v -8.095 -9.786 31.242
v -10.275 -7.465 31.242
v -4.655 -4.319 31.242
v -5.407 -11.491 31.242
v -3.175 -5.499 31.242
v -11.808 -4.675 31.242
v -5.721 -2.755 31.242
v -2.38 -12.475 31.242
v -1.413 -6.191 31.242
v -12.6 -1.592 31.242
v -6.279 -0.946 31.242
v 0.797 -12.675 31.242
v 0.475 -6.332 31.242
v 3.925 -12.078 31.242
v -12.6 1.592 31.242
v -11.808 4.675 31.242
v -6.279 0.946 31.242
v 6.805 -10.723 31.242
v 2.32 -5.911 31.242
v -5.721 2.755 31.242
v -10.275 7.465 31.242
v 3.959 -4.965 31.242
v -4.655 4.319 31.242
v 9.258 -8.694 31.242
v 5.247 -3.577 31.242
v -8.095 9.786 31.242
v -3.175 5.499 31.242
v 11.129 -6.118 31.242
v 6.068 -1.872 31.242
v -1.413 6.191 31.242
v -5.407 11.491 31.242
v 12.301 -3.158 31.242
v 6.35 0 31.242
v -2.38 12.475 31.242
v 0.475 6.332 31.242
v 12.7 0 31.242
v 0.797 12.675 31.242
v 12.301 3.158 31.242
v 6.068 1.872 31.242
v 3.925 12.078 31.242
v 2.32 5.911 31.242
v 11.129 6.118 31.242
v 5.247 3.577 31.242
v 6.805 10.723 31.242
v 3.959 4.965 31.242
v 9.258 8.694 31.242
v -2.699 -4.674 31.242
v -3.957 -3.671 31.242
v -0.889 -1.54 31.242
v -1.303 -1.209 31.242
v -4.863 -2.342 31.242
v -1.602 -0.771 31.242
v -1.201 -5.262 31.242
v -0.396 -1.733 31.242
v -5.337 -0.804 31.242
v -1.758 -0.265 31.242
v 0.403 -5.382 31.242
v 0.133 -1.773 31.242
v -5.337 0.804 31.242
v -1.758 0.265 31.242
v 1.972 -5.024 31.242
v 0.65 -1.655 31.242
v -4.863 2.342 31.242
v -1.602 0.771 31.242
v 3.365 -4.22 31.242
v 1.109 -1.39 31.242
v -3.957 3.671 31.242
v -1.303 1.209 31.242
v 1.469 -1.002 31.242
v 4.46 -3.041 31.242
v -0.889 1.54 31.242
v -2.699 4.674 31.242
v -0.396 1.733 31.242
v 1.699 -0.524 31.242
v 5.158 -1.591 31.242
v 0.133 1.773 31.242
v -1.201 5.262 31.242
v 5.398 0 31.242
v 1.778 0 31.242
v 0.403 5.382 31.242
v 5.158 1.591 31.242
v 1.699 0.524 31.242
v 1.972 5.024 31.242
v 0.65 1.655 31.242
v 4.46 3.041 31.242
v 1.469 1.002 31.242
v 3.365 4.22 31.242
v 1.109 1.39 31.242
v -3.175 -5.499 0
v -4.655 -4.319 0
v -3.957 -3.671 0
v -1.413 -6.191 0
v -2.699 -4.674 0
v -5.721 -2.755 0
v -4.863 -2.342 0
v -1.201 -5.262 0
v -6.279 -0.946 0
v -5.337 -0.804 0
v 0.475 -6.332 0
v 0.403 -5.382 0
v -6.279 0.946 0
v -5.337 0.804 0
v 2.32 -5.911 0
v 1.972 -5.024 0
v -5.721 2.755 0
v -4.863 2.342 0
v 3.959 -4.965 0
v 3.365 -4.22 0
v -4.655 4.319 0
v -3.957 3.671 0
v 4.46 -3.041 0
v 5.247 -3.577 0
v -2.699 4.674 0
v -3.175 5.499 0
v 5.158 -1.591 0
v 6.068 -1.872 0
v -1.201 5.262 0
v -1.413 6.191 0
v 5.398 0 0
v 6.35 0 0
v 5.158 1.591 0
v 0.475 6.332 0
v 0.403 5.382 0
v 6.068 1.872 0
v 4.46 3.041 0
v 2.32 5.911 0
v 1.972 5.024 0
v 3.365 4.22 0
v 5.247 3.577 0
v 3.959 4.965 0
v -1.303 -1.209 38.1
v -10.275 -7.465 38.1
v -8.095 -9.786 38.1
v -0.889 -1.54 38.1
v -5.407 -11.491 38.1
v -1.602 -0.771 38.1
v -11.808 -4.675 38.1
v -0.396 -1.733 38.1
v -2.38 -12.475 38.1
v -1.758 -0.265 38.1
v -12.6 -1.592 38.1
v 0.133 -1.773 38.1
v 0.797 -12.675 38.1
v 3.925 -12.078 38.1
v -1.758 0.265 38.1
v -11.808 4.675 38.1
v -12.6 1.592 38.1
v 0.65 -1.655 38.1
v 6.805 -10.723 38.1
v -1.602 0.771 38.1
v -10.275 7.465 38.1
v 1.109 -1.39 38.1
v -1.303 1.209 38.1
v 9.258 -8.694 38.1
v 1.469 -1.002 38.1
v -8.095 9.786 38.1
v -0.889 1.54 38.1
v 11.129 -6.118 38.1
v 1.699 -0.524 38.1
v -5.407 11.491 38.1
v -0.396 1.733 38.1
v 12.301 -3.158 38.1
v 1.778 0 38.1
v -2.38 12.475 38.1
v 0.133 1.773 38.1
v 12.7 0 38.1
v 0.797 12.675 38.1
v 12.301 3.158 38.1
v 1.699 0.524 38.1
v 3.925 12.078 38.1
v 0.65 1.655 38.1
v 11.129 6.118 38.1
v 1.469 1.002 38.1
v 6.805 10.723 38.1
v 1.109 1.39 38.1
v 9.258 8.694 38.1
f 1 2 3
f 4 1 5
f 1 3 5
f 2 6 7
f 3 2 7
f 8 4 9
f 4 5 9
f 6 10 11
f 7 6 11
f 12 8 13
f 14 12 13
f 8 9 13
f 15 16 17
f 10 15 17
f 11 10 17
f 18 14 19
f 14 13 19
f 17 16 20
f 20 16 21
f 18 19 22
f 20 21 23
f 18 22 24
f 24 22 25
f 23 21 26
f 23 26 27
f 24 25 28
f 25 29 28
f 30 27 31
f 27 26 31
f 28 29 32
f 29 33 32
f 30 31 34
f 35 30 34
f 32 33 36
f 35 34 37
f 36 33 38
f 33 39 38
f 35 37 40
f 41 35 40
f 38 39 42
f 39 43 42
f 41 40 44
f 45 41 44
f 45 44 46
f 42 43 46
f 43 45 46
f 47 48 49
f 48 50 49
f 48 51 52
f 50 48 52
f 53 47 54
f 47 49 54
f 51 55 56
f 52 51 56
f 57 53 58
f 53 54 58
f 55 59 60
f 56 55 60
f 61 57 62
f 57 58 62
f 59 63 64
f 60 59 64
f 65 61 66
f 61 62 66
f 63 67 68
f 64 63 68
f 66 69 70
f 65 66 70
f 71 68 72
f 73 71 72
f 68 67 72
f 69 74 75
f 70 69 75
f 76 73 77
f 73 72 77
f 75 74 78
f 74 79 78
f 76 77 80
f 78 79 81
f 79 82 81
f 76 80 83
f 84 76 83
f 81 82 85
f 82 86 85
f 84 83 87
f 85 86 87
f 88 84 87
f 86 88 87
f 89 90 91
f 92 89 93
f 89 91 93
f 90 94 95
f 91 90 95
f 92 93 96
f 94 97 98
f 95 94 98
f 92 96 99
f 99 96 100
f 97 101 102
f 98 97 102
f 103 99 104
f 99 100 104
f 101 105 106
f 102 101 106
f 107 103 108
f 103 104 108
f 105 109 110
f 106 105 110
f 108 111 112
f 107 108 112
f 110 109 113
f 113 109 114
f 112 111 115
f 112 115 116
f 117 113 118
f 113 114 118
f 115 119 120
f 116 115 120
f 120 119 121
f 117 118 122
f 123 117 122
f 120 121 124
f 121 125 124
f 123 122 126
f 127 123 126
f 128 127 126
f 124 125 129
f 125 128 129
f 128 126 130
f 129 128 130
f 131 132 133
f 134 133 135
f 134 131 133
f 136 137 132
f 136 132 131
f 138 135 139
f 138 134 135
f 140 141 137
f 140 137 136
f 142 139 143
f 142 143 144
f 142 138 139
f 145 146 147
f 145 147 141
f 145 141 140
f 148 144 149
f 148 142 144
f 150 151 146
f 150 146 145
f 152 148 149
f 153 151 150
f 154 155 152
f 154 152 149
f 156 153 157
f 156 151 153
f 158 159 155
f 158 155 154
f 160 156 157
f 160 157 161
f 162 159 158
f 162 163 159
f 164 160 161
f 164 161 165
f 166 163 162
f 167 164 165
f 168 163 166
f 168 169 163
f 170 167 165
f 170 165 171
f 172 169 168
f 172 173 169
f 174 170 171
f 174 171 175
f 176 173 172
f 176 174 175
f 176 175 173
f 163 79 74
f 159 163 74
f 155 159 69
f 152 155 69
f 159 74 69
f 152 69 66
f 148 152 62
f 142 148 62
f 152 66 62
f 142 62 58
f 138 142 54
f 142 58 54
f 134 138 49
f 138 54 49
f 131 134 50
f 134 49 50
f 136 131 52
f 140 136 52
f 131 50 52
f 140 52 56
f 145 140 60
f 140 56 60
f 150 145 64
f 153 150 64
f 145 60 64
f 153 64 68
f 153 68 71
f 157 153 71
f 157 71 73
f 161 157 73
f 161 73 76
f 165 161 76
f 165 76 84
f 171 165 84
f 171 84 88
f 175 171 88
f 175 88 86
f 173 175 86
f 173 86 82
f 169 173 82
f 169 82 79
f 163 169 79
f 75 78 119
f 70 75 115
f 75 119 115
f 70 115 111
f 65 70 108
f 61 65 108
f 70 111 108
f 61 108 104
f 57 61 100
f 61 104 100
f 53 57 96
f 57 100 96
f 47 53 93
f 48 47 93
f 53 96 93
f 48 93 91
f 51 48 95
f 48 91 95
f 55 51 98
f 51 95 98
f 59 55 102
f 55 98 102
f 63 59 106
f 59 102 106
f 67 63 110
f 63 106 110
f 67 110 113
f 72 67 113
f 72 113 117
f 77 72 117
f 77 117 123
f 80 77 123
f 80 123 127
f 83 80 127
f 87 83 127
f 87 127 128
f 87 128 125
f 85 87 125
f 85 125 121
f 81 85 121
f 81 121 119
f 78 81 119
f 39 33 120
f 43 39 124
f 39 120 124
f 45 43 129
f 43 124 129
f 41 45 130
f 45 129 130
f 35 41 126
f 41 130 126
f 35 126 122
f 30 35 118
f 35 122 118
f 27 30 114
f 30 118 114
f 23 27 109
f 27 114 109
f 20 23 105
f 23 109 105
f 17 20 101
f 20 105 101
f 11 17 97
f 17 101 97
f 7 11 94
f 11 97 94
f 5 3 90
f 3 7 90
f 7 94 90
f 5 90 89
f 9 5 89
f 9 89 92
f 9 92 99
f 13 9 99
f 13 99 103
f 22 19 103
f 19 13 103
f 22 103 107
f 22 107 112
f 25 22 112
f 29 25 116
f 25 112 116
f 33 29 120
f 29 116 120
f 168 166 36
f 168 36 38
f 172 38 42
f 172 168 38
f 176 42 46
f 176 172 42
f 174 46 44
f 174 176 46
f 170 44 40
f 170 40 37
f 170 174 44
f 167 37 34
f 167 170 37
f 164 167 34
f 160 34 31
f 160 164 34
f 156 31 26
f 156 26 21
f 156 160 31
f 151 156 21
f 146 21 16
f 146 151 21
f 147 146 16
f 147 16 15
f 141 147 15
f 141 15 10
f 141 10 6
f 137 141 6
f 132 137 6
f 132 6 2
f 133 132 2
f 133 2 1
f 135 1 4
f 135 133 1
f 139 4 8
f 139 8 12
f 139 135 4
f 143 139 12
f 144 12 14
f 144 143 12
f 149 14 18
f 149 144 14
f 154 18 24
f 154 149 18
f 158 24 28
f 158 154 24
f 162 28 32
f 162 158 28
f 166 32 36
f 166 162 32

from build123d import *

# Parameters (mm, degrees)
F0_R     = 6.35
F1_DEPTH = 38.1
F3_R     = 5.3975
F4_DEPTH = 32.512
F5_R     = 12.7
F6_DEPTH = 6.858
F2_R     = 1.778
F7_DEPTH = 50.292


with BuildPart() as f1:
    # F0 (on Top) → F1 (new body)
    with BuildSketch(Plane.XY):
        Circle(F0_R)
    extrude(amount=F1_DEPTH)

    # F3 (on face) → F4 (cut)
    with BuildSketch(Plane(origin=(0, 0, 0), x_dir=(1, 0, 0), z_dir=(0, 0, -1))):
        Circle(F3_R)
    extrude(amount=-F4_DEPTH, mode=Mode.SUBTRACT)

    # F5 (on face) → F6 (join)
    with BuildSketch(Plane.XY.offset(38.1)):
        Circle(F5_R)
    extrude(amount=-F6_DEPTH)

    # F2 (on face) → F7 (cut)
    with BuildSketch(Plane(origin=(0, 0, 0), x_dir=(1, 0, 0), z_dir=(0, 0, -1))):
        Circle(F2_R)
    extrude(amount=-F7_DEPTH, mode=Mode.SUBTRACT)


solid = f1.part
